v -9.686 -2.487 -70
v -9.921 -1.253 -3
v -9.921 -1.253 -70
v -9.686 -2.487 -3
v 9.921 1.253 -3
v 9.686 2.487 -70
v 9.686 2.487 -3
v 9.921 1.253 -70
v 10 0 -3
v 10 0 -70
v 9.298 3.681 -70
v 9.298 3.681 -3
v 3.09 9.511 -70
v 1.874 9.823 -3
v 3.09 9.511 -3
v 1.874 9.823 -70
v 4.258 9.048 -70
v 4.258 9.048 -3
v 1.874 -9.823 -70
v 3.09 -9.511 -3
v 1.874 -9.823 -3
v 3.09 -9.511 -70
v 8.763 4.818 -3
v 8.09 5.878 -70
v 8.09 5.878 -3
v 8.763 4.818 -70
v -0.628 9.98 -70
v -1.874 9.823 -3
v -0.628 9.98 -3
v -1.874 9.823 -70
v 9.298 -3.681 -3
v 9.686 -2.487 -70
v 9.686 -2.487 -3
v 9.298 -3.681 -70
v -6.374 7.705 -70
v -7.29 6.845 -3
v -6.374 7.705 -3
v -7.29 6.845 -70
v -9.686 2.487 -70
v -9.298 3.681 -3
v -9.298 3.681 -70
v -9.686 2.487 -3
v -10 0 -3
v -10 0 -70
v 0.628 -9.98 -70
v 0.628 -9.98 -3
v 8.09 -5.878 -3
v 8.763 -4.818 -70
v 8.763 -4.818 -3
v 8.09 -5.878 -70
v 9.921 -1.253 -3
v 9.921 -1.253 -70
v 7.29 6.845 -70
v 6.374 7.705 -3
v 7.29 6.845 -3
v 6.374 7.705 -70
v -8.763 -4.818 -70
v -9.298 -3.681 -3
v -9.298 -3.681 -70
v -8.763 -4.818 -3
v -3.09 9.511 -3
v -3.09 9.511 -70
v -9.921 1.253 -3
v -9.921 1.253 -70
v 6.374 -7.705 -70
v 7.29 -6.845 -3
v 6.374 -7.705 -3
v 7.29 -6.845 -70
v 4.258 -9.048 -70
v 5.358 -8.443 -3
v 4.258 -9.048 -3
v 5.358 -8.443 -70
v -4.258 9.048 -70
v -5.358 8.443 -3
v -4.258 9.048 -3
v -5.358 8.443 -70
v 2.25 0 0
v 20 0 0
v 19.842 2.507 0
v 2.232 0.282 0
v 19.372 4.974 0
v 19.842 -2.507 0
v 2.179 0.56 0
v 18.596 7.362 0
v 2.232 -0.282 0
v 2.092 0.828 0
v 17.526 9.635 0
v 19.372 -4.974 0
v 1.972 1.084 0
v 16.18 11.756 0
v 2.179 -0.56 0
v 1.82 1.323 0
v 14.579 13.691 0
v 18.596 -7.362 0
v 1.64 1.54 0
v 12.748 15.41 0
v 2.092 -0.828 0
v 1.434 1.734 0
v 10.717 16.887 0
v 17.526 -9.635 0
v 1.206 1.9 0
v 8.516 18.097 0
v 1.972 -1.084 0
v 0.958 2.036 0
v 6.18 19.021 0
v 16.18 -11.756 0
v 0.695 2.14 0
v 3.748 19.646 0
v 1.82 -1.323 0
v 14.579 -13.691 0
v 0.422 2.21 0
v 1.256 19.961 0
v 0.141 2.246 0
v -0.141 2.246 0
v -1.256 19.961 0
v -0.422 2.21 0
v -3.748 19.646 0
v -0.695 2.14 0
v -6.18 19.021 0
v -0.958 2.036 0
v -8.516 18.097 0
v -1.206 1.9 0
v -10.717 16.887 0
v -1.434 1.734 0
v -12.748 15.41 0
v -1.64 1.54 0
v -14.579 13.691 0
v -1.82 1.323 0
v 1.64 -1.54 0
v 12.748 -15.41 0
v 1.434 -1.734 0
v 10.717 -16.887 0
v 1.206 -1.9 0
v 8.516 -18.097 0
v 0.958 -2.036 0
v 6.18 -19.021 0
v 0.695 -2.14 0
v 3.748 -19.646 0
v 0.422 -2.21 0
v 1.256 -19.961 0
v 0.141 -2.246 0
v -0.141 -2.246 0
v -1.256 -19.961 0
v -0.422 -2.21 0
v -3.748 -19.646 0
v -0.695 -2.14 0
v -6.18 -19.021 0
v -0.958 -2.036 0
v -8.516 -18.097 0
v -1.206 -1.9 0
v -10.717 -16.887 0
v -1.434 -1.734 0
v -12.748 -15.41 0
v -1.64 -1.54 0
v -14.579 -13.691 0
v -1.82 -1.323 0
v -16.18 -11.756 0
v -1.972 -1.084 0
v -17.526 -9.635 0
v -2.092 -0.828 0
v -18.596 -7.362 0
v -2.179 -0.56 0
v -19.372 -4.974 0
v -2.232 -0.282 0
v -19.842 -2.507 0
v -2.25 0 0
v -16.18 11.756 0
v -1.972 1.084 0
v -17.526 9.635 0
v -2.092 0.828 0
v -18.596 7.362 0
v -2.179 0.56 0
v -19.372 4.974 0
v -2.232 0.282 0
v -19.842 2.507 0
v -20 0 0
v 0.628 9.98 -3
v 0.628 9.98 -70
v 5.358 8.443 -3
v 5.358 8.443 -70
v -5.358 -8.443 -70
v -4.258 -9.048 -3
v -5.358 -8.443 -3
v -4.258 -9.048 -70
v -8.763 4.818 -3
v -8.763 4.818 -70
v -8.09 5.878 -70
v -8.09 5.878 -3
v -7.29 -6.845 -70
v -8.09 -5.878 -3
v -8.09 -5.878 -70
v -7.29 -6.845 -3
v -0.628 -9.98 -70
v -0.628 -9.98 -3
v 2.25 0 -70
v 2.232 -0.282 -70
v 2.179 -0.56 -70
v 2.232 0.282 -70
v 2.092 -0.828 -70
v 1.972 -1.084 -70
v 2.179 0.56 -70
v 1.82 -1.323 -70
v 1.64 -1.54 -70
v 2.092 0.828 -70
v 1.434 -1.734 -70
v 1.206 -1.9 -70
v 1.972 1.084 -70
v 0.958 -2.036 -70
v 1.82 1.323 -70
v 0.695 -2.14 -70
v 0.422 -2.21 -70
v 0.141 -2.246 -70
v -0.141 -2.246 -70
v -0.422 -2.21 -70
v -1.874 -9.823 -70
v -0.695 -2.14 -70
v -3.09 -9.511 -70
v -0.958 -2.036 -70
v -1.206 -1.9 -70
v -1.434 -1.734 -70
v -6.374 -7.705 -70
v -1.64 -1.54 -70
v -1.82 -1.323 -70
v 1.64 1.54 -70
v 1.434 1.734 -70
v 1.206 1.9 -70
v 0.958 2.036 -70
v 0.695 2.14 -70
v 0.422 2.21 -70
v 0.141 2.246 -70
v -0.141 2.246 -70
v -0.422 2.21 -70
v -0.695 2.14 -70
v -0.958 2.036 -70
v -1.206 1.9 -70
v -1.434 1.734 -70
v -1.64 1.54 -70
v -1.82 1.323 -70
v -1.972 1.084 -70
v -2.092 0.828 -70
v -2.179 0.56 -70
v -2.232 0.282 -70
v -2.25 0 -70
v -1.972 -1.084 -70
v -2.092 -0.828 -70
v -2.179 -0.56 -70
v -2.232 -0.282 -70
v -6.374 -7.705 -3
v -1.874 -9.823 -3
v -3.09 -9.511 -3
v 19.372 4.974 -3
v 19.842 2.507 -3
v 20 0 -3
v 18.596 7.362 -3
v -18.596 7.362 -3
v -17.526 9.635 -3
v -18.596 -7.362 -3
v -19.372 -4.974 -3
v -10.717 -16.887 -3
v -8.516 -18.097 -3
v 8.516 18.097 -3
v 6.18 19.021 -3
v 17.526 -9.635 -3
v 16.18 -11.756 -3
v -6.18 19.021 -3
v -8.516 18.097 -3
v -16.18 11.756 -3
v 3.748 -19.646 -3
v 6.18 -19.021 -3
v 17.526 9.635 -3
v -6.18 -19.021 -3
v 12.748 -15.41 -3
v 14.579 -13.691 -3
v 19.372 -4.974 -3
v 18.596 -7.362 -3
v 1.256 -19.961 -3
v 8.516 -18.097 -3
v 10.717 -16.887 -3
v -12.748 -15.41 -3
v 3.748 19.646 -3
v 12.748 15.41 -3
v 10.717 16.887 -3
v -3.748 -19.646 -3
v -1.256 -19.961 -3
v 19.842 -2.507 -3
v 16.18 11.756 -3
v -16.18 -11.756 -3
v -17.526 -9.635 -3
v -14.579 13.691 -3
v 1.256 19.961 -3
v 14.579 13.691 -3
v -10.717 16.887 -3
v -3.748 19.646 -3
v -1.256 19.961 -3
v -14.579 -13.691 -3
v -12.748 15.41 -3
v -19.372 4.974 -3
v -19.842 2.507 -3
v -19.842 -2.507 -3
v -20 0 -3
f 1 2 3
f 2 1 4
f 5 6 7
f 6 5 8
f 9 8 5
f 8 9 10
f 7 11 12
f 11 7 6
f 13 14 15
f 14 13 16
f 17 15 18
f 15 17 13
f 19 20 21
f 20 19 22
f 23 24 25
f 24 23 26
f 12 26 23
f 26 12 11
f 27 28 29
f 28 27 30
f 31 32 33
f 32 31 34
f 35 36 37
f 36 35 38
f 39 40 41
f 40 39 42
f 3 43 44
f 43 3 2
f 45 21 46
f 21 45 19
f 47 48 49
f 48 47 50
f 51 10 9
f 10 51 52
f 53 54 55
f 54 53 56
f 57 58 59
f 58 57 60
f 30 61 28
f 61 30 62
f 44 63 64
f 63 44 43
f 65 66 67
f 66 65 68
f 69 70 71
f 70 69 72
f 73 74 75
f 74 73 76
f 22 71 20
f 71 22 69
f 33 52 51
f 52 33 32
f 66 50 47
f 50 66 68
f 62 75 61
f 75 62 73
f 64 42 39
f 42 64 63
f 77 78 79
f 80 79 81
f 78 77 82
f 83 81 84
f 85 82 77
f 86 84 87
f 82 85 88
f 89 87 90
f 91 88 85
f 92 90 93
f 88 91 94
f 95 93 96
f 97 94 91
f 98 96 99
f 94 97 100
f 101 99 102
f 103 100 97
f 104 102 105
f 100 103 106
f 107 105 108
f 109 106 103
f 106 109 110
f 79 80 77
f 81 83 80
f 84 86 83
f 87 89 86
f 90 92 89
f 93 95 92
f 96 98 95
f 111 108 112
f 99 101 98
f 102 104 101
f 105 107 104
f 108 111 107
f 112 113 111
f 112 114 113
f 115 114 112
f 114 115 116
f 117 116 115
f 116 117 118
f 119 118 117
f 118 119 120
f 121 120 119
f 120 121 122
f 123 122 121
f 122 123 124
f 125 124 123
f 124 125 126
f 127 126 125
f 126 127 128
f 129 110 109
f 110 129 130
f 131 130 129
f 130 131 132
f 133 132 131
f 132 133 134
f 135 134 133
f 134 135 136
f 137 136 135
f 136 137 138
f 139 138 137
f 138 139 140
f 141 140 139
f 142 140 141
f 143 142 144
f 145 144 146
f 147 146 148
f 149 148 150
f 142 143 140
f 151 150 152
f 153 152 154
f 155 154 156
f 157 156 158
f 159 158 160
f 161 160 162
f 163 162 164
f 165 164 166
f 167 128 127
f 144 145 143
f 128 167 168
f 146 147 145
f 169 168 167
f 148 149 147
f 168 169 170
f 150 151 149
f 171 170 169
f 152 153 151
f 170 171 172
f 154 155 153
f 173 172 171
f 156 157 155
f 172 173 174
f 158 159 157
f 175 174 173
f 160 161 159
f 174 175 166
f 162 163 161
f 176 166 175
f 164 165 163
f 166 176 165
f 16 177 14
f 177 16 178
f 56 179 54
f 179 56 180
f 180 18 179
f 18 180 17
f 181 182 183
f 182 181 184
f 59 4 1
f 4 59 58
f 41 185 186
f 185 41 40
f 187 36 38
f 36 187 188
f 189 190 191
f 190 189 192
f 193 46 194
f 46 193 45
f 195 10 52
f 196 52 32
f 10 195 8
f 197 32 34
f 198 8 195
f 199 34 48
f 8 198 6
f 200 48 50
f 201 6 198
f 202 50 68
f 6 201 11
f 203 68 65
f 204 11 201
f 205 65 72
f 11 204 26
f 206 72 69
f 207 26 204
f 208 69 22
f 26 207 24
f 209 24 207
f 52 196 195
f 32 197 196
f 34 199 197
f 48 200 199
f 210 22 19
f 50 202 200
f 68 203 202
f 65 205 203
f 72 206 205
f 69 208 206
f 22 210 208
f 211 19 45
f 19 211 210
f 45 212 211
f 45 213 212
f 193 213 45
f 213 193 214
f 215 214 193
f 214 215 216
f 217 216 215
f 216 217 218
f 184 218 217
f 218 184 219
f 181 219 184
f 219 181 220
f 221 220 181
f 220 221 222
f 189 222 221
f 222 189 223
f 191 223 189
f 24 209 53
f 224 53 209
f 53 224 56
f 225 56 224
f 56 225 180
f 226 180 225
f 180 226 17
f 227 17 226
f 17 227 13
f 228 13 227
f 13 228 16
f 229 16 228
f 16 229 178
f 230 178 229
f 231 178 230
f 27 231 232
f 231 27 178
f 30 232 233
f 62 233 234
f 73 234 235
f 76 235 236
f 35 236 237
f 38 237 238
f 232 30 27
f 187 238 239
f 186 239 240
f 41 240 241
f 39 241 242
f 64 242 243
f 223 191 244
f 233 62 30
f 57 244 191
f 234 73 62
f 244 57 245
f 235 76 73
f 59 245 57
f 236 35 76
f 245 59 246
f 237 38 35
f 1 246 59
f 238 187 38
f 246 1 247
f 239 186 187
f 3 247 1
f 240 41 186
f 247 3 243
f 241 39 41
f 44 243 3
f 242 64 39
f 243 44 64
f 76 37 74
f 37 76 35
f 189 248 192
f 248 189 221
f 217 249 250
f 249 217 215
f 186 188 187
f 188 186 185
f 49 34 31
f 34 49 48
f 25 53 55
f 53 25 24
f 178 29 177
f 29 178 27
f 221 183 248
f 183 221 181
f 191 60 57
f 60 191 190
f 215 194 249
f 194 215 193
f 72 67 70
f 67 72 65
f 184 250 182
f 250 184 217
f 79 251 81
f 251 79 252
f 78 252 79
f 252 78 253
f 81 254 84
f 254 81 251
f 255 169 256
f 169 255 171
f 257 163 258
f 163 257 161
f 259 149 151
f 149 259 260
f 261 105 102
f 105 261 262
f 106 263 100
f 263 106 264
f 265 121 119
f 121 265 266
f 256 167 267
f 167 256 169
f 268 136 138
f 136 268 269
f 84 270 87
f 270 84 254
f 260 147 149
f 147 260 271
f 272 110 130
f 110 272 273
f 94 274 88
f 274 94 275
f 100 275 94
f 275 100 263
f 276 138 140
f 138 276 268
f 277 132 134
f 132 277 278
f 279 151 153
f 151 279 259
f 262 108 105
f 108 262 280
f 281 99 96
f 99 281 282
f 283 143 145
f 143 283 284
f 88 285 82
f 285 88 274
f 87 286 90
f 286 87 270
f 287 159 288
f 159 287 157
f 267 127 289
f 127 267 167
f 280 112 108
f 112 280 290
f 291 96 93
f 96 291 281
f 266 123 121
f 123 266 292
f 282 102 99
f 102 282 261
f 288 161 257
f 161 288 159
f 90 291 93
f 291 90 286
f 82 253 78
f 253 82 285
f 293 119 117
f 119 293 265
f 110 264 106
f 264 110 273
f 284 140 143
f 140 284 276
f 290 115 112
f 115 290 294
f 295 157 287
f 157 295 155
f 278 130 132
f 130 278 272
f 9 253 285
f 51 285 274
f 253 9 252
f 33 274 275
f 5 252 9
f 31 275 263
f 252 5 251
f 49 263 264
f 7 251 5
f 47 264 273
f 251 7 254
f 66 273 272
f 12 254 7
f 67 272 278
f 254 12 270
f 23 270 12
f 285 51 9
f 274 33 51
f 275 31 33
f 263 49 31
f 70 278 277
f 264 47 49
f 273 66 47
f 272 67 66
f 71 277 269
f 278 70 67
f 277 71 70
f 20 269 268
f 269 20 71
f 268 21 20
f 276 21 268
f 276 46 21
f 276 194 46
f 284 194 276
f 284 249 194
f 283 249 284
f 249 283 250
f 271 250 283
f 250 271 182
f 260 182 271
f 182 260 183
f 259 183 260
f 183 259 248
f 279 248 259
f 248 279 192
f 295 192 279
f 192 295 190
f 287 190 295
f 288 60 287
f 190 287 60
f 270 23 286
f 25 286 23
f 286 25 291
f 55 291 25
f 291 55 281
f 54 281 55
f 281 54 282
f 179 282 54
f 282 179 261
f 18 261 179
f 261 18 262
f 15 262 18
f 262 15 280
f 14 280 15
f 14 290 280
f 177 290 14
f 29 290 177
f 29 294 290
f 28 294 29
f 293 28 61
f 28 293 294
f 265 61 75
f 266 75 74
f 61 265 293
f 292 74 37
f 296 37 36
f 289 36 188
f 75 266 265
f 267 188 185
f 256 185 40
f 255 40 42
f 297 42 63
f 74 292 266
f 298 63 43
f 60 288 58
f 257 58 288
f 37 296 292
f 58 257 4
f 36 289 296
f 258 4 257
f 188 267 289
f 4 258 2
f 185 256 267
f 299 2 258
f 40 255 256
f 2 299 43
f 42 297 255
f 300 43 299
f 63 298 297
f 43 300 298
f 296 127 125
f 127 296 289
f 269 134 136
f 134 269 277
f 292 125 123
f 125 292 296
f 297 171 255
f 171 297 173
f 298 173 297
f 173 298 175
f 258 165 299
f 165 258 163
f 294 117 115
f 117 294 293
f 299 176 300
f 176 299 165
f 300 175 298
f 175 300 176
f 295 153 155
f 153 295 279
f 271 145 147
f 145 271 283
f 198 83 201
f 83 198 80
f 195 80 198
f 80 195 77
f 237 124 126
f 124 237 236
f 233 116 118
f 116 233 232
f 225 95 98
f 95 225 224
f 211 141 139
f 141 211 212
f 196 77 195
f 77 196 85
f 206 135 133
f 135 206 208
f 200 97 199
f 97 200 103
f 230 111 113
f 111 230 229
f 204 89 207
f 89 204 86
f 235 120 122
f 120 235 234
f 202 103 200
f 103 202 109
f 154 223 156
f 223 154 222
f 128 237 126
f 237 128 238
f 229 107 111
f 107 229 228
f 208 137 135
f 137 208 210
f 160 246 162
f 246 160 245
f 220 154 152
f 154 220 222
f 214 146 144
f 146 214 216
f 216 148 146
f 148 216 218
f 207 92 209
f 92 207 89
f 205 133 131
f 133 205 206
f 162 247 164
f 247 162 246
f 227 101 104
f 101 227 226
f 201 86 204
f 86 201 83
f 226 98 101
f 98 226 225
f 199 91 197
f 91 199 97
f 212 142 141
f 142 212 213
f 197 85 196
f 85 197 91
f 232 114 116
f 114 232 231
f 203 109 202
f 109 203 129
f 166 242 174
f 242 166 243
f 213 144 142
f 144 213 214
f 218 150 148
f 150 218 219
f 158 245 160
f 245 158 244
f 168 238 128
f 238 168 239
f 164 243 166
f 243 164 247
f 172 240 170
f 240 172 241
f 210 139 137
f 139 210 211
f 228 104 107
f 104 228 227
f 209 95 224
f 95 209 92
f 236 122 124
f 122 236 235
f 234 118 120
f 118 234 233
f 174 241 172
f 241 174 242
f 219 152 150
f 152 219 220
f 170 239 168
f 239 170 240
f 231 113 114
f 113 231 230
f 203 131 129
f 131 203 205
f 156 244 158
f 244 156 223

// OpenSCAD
$fn = 50;


difference() {
	union() {
		translate(v = [0, 0, -70.0000000000]) {
			cylinder(h = 70, r = 10.0000000000);
		}
		translate(v = [0, 0, -3.0000000000]) {
			cylinder(h = 3, r = 20.0000000000);
		}
	}
	union() {
		#translate(v = [0, 0, -70]) {
			cylinder(h = 70, r = 2.2500000000);
		}
	}
}
